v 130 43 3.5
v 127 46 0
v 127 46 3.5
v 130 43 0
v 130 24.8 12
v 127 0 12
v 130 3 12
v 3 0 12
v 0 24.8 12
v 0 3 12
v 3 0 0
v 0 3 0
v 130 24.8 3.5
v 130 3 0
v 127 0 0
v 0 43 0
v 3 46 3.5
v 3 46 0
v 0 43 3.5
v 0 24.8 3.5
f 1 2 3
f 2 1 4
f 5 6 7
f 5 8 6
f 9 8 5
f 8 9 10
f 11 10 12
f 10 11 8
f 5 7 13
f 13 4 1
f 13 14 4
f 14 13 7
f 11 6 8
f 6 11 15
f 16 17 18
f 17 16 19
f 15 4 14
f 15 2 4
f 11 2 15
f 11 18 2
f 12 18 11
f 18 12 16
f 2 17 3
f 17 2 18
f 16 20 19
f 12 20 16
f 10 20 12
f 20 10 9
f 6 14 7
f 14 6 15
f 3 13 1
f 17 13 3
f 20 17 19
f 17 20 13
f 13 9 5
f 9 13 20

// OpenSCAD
$fn = 32;

// ----------------------------------------------------------------------
// Stepped bar: sidestep, 130 x 46 x 12/3.5 mm
// ----------------------------------------------------------------------

// --- parameters (mm) ---
bar_l = 130;              // bar length, X
bar_w = 46;               // bar width, Y
plate_t = 12;             // thickness of the thick zone, Z
thin_t = 3.5;             // thickness of the thin zone
corner_c = 3;             // corner chamfer of the bar
step_cut = 8.5;           // material removed from the thin zone
ledge_y = 24.8;           // start of the ledge from the front edge
depth_1 = 8.5;            // depth of cut 1 from the top face
fit_tol = 0.1;            // declared fit tolerance (prompt contract)
free_tol = 0.3;           // declared free tolerance (prompt contract)

profile = [[3, 0], [127, 0], [130, 3], [130, 43], [127, 46], [3, 46], [0, 43], [0, 3]];  // primary outline, 8 points, counter clockwise
void_1 = [[-1, 24.8], [131, 24.8], [131, 47], [-1, 47]];  // ledge cut along one edge, 4 points

// --- the one profile operation ---
difference() {
  linear_extrude(height = plate_t) polygon(points = profile);
  translate([0, 0, plate_t - depth_1])
    linear_extrude(height = depth_1 + 1) polygon(points = void_1);
}
